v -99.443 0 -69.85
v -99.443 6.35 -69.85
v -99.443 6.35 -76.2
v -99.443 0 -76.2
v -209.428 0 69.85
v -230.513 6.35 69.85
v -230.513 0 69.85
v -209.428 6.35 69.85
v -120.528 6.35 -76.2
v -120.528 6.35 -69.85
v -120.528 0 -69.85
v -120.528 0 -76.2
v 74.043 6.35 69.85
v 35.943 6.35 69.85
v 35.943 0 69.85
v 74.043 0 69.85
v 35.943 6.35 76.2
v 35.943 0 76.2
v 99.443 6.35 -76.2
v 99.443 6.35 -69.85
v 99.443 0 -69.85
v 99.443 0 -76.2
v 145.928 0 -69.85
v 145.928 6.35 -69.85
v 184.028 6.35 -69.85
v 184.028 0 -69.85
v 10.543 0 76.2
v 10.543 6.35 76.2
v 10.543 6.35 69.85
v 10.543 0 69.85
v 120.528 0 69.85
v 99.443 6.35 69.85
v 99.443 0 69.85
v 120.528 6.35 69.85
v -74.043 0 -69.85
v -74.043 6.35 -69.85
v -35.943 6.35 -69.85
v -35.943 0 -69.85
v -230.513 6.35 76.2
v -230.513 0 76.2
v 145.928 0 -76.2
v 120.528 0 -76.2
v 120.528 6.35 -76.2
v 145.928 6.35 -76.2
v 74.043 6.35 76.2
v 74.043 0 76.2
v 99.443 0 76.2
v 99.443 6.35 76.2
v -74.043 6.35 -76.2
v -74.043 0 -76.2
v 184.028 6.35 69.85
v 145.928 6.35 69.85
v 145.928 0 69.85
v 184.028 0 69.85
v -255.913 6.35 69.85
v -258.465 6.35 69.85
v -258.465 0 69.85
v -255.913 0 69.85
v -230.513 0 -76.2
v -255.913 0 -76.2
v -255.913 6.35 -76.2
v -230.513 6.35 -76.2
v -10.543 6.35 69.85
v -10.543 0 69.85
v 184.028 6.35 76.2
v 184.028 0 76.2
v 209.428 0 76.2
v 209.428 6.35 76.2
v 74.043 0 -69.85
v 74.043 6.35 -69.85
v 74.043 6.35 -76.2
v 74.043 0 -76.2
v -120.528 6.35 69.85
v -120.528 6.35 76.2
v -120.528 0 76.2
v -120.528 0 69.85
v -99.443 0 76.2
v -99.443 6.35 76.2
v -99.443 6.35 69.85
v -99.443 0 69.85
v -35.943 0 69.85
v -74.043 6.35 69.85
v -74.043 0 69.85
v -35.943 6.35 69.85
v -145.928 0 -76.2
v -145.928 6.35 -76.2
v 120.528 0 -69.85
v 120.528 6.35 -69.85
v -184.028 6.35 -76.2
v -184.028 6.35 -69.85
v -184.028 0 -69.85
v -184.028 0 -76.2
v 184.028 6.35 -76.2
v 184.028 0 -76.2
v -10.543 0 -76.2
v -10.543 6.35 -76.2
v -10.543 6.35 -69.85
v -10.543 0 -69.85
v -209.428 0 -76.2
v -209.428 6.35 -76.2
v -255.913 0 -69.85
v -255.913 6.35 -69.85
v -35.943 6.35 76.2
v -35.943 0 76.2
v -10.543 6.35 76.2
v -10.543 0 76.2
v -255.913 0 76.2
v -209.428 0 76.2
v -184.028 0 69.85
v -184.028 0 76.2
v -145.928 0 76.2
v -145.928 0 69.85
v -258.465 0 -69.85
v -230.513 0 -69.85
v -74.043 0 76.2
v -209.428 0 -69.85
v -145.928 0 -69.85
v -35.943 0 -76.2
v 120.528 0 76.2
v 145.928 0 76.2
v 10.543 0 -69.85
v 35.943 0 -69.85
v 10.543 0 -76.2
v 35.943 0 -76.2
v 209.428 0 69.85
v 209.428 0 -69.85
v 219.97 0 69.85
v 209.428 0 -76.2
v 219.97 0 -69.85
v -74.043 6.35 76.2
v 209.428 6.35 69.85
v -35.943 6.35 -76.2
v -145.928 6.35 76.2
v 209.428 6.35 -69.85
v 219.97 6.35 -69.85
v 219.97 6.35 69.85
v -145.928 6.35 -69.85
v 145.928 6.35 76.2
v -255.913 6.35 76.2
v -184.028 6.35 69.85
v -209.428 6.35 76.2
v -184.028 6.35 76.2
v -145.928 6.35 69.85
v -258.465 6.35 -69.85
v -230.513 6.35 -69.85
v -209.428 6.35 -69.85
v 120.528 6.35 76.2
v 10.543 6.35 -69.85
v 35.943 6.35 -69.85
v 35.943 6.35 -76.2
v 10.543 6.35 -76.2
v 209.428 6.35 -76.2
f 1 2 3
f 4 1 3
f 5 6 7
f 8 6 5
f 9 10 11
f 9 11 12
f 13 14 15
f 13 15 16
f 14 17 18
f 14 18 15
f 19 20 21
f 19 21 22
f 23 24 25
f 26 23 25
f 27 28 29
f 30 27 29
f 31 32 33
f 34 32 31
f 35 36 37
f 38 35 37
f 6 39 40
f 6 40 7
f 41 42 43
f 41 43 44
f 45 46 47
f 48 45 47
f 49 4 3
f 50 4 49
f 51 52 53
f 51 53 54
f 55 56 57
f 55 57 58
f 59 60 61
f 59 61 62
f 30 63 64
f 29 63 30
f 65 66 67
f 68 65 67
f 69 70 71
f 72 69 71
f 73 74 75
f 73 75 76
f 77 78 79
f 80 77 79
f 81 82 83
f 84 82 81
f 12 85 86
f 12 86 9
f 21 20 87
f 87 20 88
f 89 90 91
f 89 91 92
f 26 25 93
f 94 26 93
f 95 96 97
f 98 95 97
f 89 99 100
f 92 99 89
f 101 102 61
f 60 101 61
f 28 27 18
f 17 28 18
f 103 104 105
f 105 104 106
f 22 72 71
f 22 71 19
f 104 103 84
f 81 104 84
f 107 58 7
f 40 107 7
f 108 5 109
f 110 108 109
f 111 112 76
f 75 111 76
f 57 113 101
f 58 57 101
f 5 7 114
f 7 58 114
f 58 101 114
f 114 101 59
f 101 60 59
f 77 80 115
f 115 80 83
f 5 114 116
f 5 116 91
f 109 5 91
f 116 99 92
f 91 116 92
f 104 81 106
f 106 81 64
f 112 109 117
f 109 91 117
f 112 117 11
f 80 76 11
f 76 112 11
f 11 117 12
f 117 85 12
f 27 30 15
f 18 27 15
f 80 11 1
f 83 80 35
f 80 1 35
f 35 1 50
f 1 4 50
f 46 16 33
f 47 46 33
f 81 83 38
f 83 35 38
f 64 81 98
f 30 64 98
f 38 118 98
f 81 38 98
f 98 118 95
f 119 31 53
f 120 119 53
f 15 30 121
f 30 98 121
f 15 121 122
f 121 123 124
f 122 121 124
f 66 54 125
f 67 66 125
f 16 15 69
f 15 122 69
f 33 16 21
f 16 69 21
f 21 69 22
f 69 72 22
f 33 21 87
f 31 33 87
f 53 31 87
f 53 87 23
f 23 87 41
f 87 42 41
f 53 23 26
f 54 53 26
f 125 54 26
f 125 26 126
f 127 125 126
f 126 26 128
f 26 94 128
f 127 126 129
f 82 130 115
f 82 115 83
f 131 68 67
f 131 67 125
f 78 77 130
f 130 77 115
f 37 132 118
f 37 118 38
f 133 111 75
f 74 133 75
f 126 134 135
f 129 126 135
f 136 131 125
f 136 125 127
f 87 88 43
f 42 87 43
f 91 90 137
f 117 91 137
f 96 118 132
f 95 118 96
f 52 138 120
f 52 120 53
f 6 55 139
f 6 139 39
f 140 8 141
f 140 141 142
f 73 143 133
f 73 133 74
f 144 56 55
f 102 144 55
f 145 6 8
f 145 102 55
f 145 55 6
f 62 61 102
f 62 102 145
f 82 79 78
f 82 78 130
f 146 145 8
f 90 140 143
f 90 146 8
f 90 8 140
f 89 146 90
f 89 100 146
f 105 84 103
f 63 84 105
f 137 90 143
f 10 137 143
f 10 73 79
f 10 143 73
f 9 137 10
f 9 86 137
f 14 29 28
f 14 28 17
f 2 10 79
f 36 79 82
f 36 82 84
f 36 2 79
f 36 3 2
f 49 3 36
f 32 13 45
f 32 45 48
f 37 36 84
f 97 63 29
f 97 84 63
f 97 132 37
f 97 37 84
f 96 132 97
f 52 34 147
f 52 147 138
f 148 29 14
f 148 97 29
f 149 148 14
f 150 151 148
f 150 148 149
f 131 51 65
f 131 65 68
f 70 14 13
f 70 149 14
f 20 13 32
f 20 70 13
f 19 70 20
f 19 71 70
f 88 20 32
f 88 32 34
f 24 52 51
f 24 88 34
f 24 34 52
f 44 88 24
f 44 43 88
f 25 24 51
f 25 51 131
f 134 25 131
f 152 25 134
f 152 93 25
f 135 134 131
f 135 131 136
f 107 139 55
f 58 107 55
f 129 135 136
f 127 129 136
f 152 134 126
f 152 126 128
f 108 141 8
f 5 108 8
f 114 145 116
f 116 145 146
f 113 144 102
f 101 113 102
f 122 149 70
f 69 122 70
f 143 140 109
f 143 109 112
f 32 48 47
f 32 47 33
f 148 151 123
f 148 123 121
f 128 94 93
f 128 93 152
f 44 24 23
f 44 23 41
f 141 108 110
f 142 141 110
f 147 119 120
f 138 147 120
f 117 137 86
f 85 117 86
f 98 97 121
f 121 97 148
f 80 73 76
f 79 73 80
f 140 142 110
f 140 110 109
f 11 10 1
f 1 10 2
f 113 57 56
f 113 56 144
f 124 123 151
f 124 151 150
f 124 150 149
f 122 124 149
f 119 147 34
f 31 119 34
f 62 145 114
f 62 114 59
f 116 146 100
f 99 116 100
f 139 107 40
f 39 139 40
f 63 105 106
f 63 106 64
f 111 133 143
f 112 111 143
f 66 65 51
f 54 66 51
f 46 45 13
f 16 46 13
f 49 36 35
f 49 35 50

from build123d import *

# Parameters (mm, degrees)
SKETCH1_W                 = 516.930563546
SKETCH1_H                 = 152.4
BOSS_EXTRUDE1_DEPTH       = 6.35
SKETCH2_W                 = 21.085226308
SKETCH2_H                 = 6.35
SKETCH2_W_2               = 19.05
CUT_EXTRUDE1_DEPTH        = 7.35
LPATTERN1_COUNT           = 3
LPATTERN1_PITCH           = 109.985226308
LPATTERN1_COL_COUNT       = 3
LPATTERN1_COL_PITCH       = 109.985226308
MIRROR1_COPY_1_SKETCH_W   = 21.085226308
MIRROR1_COPY_1_SKETCH_H   = 6.35
MIRROR1_COPY_1_SKETCH_W_2 = 19.05
MIRROR1_COPY_1_DEPTH      = 7.35
MIRROR1_COPY_2_SKETCH_W   = 21.085226308
MIRROR1_COPY_2_SKETCH_H   = 6.35
MIRROR1_COPY_2_SKETCH_W_2 = 19.05
MIRROR1_COPY_2_DEPTH      = 7.35
MIRROR1_COPY_3_SKETCH_W   = 21.085226308
MIRROR1_COPY_3_SKETCH_H   = 6.35
MIRROR1_COPY_3_SKETCH_W_2 = 19.05
MIRROR1_COPY_3_DEPTH      = 7.35
MIRROR1_COPY_4_SKETCH_W   = 21.085226308
MIRROR1_COPY_4_SKETCH_H   = 6.35
MIRROR1_COPY_4_SKETCH_W_2 = 19.05
MIRROR1_COPY_4_DEPTH      = 7.35
CUT_EXTRUDE2_DEPTH        = 7.35


with BuildPart() as part:
    # Sketch1 → Boss-Extrude1 (new body)
    with BuildSketch(Plane(origin=(0, 0, 0), x_dir=(1, 0, 0), z_dir=(0, 1, 0))):
        Rectangle(SKETCH1_W, SKETCH1_H)
    extrude(amount=BOSS_EXTRUDE1_DEPTH)

    # Sketch2 → Cut-Extrude1 (cut, through all)
    with BuildSketch(Plane(origin=(0, 6.35, 0), x_dir=(1, 0, 0), z_dir=(0, 1, 0))):
        with Locations((0, -73.025)):
            Rectangle(SKETCH2_W, SKETCH2_H)
        with Locations((-45.467613154, -73.025)):
            Rectangle(SKETCH2_W_2, SKETCH2_H)
        with Locations((45.467613154, -73.025)):
            Rectangle(SKETCH2_W_2, SKETCH2_H)
    cut_extrude1 = extrude(amount=-CUT_EXTRUDE1_DEPTH, mode=Mode.SUBTRACT)

    # LPattern1: Cut-Extrude1 ×3
    with Locations(*[(i * LPATTERN1_PITCH, 0, 0) for i in range(1, LPATTERN1_COUNT)]):
        add(cut_extrude1, mode=Mode.SUBTRACT)

    # LPattern1 col: Cut-Extrude1 ×3
    with Locations(*[(-i * LPATTERN1_COL_PITCH, 0, 0) for i in range(1, LPATTERN1_COL_COUNT)]):
        add(cut_extrude1, mode=Mode.SUBTRACT)

    # Mirror1: Cut-Extrude1 across plane
    add(cut_extrude1.mirror(Plane.XY), mode=Mode.SUBTRACT)

    # Mirror1 copy 1 sketch → Mirror1 copy 1 (cut, through all)
    with BuildSketch(Plane(origin=(109.985226308, 6.35, 0), x_dir=(1, 0, 0), z_dir=(0, 1, 0))):
        with Locations((0, 73.025)):
            Rectangle(MIRROR1_COPY_1_SKETCH_W, MIRROR1_COPY_1_SKETCH_H)
        with Locations((-45.467613154, 73.025)):
            Rectangle(MIRROR1_COPY_1_SKETCH_W_2, MIRROR1_COPY_1_SKETCH_H)
        with Locations((45.467613154, 73.025)):
            Rectangle(MIRROR1_COPY_1_SKETCH_W_2, MIRROR1_COPY_1_SKETCH_H)
    extrude(amount=-MIRROR1_COPY_1_DEPTH, mode=Mode.SUBTRACT)

    # Mirror1 copy 2 sketch → Mirror1 copy 2 (cut, through all)
    with BuildSketch(Plane(origin=(219.970452616, 6.35, 0), x_dir=(1, 0, 0), z_dir=(0, 1, 0))):
        with Locations((0, 73.025)):
            Rectangle(MIRROR1_COPY_2_SKETCH_W, MIRROR1_COPY_2_SKETCH_H)
        with Locations((-45.467613154, 73.025)):
            Rectangle(MIRROR1_COPY_2_SKETCH_W_2, MIRROR1_COPY_2_SKETCH_H)
        with Locations((45.467613154, 73.025)):
            Rectangle(MIRROR1_COPY_2_SKETCH_W_2, MIRROR1_COPY_2_SKETCH_H)
    extrude(amount=-MIRROR1_COPY_2_DEPTH, mode=Mode.SUBTRACT)

    # Mirror1 copy 3 sketch → Mirror1 copy 3 (cut, through all)
    with BuildSketch(Plane(origin=(-109.985226308, 6.35, 0), x_dir=(1, 0, 0), z_dir=(0, 1, 0))):
        with Locations((0, 73.025)):
            Rectangle(MIRROR1_COPY_3_SKETCH_W, MIRROR1_COPY_3_SKETCH_H)
        with Locations((-45.467613154, 73.025)):
            Rectangle(MIRROR1_COPY_3_SKETCH_W_2, MIRROR1_COPY_3_SKETCH_H)
        with Locations((45.467613154, 73.025)):
            Rectangle(MIRROR1_COPY_3_SKETCH_W_2, MIRROR1_COPY_3_SKETCH_H)
    extrude(amount=-MIRROR1_COPY_3_DEPTH, mode=Mode.SUBTRACT)

    # Mirror1 copy 4 sketch → Mirror1 copy 4 (cut, through all)
    with BuildSketch(Plane(origin=(-219.970452616, 6.35, 0), x_dir=(1, 0, 0), z_dir=(0, 1, 0))):
        with Locations((0, 73.025)):
            Rectangle(MIRROR1_COPY_4_SKETCH_W, MIRROR1_COPY_4_SKETCH_H)
        with Locations((-45.467613154, 73.025)):
            Rectangle(MIRROR1_COPY_4_SKETCH_W_2, MIRROR1_COPY_4_SKETCH_H)
        with Locations((45.467613154, 73.025)):
            Rectangle(MIRROR1_COPY_4_SKETCH_W_2, MIRROR1_COPY_4_SKETCH_H)
    extrude(amount=-MIRROR1_COPY_4_DEPTH, mode=Mode.SUBTRACT)

    # Sketch3 → Cut-Extrude2 (cut, through all)
    with BuildSketch(Plane(origin=(0, 6.35, 0), x_dir=(1, 0, 0), z_dir=(0, 1, 0))):
        Polygon((219.970452616, 69.85), (219.970452616, -76.2), (258.465281773, -76.2), (258.465281773, 76.2), (219.970452616, 76.2), align=None)
    extrude(amount=-CUT_EXTRUDE2_DEPTH, mode=Mode.SUBTRACT)


solid = part.part
